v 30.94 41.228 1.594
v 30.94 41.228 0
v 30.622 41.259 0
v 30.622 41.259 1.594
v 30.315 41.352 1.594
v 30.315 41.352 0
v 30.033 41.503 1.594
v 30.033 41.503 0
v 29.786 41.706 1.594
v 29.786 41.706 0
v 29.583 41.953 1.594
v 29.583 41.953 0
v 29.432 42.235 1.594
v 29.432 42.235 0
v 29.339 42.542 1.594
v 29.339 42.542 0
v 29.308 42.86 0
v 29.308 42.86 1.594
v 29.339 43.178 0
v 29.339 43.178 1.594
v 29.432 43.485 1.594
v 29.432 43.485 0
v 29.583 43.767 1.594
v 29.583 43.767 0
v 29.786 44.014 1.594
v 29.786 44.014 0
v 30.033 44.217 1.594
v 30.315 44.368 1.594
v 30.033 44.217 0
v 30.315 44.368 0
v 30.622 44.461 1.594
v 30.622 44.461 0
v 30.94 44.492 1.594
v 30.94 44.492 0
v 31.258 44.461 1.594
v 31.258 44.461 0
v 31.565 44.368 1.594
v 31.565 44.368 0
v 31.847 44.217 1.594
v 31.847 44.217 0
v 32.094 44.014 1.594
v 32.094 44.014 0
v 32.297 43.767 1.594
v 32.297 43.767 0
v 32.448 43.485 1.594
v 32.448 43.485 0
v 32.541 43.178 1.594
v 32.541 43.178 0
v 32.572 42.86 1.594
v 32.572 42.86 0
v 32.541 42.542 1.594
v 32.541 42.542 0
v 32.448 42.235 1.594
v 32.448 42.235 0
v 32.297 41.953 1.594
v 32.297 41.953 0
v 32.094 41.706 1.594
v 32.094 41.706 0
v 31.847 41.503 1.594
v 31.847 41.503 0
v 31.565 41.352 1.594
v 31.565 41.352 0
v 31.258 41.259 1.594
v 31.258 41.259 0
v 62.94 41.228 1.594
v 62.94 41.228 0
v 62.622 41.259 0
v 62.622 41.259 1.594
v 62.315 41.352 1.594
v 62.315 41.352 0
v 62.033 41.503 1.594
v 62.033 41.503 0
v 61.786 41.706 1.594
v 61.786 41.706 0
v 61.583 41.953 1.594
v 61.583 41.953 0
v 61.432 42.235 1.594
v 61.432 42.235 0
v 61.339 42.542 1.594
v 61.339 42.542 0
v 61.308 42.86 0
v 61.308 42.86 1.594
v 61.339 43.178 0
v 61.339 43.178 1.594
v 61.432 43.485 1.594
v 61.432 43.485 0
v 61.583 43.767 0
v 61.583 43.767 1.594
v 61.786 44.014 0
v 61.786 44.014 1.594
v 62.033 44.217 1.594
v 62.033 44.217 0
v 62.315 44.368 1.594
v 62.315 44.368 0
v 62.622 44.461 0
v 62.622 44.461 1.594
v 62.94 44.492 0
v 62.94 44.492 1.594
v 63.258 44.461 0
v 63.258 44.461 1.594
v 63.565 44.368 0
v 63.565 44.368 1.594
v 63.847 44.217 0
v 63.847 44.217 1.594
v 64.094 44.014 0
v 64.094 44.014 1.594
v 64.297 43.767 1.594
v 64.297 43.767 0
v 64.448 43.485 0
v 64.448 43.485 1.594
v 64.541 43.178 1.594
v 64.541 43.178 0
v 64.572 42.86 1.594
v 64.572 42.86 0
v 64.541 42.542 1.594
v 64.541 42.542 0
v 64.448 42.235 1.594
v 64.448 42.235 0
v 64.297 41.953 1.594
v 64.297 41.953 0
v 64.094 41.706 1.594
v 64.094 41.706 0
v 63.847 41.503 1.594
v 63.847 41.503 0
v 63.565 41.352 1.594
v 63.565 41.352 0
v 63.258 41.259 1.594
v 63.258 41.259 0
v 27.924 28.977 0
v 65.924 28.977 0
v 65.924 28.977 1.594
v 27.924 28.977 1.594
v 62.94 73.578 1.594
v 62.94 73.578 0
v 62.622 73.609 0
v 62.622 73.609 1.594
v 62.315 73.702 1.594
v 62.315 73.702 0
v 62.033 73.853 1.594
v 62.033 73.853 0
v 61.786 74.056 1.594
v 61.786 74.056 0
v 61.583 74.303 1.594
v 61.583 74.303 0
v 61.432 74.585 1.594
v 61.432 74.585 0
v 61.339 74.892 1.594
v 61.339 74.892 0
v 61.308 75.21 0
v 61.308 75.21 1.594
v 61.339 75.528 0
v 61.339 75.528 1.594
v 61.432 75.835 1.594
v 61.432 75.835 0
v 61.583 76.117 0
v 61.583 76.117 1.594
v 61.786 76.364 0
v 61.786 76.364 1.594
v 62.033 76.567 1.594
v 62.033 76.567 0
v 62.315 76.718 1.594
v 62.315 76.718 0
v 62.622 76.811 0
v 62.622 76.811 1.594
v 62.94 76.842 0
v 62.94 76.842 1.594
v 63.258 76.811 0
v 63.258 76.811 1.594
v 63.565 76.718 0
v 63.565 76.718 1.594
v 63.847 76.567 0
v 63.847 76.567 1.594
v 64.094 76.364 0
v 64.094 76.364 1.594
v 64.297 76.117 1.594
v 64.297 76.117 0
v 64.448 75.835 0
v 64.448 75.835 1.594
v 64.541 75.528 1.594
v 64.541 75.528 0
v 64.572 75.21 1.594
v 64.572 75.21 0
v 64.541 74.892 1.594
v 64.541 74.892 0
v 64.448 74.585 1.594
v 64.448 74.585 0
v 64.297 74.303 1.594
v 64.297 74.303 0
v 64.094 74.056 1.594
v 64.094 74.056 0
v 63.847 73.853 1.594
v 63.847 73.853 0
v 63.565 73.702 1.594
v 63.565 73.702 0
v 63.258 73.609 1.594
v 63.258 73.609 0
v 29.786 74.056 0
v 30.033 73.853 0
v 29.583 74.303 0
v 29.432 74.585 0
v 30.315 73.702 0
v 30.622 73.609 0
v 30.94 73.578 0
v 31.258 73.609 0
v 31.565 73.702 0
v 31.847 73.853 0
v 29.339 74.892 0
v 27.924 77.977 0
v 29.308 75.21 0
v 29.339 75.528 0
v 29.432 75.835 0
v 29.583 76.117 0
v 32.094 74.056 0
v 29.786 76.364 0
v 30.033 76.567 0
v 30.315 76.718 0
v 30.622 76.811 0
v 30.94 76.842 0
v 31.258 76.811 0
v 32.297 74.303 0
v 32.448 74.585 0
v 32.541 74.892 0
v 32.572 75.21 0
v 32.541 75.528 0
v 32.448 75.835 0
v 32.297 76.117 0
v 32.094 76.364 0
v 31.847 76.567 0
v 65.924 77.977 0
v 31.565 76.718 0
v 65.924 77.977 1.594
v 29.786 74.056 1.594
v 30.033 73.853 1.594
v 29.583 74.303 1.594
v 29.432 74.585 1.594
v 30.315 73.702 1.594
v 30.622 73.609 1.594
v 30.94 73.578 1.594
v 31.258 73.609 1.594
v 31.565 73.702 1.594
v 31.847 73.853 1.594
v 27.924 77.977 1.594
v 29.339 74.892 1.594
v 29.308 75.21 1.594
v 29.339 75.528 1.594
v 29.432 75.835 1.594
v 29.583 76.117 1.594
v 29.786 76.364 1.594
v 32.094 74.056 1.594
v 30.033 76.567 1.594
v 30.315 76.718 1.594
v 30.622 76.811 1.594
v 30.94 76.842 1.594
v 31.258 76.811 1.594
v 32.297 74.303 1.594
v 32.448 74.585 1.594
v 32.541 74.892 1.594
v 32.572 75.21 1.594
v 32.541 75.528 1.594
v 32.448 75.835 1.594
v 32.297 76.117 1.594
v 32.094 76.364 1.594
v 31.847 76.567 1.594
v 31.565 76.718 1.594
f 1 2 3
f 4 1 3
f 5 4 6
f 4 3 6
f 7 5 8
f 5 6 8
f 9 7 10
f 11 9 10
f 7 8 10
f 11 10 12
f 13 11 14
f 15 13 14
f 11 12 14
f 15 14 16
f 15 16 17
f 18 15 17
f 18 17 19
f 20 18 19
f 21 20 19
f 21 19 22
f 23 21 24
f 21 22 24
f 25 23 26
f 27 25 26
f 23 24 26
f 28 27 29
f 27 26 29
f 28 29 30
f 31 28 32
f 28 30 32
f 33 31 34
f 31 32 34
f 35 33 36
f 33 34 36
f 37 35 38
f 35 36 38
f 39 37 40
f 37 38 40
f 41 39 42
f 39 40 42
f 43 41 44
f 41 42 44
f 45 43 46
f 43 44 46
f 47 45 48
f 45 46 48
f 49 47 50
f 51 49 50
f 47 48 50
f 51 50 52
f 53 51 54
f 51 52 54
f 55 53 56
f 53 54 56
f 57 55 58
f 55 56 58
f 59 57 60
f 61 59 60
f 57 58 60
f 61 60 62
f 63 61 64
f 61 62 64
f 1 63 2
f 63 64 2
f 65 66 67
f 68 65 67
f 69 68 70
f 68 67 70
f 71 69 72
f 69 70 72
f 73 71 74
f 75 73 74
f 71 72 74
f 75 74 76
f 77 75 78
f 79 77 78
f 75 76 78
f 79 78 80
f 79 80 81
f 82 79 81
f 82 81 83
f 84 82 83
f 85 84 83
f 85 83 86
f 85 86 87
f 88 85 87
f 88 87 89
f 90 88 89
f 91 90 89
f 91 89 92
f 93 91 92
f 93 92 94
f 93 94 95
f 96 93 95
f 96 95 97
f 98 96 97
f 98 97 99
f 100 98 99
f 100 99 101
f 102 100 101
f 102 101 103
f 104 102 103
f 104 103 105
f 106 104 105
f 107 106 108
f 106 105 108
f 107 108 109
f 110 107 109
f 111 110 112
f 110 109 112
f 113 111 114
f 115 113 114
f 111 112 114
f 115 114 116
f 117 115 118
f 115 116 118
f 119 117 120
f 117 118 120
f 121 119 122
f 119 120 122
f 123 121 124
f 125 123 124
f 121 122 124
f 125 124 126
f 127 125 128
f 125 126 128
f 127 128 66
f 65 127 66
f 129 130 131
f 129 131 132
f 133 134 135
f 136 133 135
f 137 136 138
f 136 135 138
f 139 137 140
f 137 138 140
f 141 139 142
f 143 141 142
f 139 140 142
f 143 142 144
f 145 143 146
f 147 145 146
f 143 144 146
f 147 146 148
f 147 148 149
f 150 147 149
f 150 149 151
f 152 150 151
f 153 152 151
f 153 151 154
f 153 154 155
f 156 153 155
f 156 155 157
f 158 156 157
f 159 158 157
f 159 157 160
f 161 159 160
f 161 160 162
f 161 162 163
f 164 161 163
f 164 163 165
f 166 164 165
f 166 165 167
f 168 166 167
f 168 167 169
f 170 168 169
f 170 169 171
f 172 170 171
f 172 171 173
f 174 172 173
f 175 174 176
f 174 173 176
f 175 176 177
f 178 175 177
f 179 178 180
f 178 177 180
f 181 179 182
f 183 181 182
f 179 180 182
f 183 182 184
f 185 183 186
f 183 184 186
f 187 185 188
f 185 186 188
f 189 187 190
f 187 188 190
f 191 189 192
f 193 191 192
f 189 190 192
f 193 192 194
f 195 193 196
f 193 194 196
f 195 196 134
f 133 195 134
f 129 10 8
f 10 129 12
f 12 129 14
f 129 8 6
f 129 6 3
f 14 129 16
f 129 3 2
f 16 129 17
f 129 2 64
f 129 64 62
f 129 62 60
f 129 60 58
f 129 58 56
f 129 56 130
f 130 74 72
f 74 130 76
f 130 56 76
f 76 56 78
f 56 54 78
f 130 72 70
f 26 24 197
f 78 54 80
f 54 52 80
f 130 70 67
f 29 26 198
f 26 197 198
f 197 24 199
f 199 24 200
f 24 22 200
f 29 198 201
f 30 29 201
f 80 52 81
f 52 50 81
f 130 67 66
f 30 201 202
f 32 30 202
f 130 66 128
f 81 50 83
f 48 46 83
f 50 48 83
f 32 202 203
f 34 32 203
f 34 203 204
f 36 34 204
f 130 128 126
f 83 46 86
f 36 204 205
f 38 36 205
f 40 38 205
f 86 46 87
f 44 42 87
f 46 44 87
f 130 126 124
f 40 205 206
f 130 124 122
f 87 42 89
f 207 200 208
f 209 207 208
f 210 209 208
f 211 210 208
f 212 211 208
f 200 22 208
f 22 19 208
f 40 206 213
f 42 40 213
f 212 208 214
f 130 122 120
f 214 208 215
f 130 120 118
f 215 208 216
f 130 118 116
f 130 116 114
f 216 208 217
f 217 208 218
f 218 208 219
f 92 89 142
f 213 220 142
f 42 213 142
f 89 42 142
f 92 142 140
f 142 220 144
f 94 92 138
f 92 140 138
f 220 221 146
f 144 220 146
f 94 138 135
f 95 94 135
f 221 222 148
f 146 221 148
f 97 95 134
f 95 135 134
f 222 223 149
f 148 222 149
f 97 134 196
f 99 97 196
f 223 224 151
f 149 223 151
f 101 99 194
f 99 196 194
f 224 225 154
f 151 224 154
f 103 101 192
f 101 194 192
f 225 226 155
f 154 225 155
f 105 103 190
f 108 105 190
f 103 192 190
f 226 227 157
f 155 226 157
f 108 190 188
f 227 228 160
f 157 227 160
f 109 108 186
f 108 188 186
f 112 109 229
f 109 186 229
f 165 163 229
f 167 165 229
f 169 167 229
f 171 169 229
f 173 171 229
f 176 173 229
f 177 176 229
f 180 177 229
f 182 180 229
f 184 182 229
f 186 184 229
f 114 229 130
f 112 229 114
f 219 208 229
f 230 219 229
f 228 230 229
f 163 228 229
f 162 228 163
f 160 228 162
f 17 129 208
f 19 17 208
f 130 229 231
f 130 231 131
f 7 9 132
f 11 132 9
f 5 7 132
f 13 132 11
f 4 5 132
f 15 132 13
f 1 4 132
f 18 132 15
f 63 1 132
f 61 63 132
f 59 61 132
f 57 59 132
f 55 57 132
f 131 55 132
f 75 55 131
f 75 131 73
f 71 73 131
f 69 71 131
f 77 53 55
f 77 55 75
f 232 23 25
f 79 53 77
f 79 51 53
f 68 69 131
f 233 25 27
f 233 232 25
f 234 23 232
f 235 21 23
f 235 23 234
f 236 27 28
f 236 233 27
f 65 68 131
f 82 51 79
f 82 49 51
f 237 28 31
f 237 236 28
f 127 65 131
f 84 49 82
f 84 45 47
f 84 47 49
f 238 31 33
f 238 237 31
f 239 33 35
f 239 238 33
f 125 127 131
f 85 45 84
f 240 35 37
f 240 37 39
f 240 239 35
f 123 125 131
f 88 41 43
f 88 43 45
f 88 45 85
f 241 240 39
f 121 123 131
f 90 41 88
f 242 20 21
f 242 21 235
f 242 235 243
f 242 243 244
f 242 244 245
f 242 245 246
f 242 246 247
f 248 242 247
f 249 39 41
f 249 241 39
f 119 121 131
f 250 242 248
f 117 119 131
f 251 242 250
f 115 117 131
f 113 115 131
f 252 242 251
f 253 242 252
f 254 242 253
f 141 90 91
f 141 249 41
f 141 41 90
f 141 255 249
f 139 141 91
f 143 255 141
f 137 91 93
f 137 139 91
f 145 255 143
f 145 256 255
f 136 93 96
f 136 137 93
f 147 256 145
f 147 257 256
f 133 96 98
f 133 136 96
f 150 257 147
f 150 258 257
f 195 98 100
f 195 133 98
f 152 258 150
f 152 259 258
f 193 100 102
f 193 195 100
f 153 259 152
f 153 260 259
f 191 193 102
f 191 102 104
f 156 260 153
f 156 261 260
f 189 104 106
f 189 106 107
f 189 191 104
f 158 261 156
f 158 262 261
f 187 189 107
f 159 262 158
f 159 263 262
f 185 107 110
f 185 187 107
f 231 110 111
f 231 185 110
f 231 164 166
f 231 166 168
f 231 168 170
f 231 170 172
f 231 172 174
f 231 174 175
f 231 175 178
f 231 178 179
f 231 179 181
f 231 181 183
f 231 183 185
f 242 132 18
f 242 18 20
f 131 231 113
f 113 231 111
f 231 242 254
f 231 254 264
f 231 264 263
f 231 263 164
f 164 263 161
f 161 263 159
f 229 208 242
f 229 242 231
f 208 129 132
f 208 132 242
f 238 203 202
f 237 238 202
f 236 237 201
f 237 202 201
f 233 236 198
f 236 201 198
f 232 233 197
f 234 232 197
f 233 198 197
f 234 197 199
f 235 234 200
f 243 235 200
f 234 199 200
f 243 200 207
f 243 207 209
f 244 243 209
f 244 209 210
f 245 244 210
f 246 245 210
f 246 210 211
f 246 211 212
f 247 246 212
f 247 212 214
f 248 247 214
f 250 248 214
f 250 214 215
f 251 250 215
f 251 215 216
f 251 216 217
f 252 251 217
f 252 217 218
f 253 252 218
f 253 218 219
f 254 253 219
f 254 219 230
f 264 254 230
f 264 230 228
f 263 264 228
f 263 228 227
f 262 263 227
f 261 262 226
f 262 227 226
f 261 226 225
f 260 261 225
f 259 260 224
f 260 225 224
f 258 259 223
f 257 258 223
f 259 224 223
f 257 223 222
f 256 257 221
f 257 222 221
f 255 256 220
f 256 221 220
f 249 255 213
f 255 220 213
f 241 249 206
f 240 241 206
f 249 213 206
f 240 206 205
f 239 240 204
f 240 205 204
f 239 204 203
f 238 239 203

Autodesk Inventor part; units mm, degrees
ref_plane "YZ Plane" through (0, 0, 0) normal (1, 0, 0) x (0, 1, 0)
ref_plane "XZ Plane" through (0, 0, 0) normal (0, 1, 0) x (-1, 0, 0)
ref_plane "BoardFrontPlane" through (0, 0, 0) normal (0, 0, 1) x (1, 0, 0)
sketch "Sketch1" plane through (0, 0, 0) normal (0, 0, 1) x (1, 0, 0)
  line L0 (27.9236, 28.9773) -> (27.9236, 77.9773)
  line L1 (27.9236, 77.9773) -> (65.9236, 77.9773)
  line L2 (65.9236, 77.9773) -> (65.9236, 28.9773)
  line L3 (65.9236, 28.9773) -> (27.9236, 28.9773)
extrude "BoardOutline" add sketch "Sketch1" along normal blind 1.594
sketch "img_Top" plane through (0, 0, 1.594) normal (0, 0, 1) x (1, 0, 0)
  line L0 (27.9236, 77.9773) -> (65.9246, 77.9773) construction
  line L1 (65.9246, 77.9773) -> (65.9246, 28.9773) construction
  line L2 (65.9246, 28.9773) -> (27.9236, 28.9773) construction
  line L3 (27.9236, 28.9773) -> (27.9236, 77.9773) construction
decal "Decal_Top"
sketch "img_Bottom" plane through (0, 0, -1.594) normal (0, 0, -1) x (1, 0, 0)
  line L0 (27.9236, -28.9773) -> (65.9246, -28.9773) construction
  line L1 (65.9246, -28.9773) -> (65.9246, -77.9773) construction
  line L2 (65.9246, -77.9773) -> (27.9236, -77.9773) construction
  line L3 (27.9236, -77.9773) -> (27.9236, -28.9773) construction
decal "Decal_Bottom"
sketch "Sketch4" plane through (0, 0, 1.594) normal (0, 0, 1) x (1, 0, 0)
  point P0 (62.94, 42.86)
hole "Free-18" at (62.94, 42.86, 1.594) direction (0, 0, -1) diameter 3.2639 end through all
sketch "Sketch5" plane through (0, 0, 1.594) normal (0, 0, 1) x (1, 0, 0)
  point P0 (30.94, 42.86)
hole "Free-19" at (30.94, 42.86, 1.594) direction (0, 0, -1) diameter 3.2639 end through all
sketch "Sketch6" plane through (0, 0, 1.594) normal (0, 0, 1) x (1, 0, 0)
  point P0 (62.94, 75.21)
hole "Free-17" at (62.94, 75.21, 1.594) direction (0, 0, -1) diameter 3.2639 end through all
sketch "Sketch7" plane through (0, 0, 1.594) normal (0, 0, 1) x (1, 0, 0)
  point P0 (30.94, 75.21)
hole "Free-16" at (30.94, 75.21, 1.594) direction (0, 0, -1) diameter 3.2639 end through all
properties part number "nanobox_v31_upgrade_BOARD"
